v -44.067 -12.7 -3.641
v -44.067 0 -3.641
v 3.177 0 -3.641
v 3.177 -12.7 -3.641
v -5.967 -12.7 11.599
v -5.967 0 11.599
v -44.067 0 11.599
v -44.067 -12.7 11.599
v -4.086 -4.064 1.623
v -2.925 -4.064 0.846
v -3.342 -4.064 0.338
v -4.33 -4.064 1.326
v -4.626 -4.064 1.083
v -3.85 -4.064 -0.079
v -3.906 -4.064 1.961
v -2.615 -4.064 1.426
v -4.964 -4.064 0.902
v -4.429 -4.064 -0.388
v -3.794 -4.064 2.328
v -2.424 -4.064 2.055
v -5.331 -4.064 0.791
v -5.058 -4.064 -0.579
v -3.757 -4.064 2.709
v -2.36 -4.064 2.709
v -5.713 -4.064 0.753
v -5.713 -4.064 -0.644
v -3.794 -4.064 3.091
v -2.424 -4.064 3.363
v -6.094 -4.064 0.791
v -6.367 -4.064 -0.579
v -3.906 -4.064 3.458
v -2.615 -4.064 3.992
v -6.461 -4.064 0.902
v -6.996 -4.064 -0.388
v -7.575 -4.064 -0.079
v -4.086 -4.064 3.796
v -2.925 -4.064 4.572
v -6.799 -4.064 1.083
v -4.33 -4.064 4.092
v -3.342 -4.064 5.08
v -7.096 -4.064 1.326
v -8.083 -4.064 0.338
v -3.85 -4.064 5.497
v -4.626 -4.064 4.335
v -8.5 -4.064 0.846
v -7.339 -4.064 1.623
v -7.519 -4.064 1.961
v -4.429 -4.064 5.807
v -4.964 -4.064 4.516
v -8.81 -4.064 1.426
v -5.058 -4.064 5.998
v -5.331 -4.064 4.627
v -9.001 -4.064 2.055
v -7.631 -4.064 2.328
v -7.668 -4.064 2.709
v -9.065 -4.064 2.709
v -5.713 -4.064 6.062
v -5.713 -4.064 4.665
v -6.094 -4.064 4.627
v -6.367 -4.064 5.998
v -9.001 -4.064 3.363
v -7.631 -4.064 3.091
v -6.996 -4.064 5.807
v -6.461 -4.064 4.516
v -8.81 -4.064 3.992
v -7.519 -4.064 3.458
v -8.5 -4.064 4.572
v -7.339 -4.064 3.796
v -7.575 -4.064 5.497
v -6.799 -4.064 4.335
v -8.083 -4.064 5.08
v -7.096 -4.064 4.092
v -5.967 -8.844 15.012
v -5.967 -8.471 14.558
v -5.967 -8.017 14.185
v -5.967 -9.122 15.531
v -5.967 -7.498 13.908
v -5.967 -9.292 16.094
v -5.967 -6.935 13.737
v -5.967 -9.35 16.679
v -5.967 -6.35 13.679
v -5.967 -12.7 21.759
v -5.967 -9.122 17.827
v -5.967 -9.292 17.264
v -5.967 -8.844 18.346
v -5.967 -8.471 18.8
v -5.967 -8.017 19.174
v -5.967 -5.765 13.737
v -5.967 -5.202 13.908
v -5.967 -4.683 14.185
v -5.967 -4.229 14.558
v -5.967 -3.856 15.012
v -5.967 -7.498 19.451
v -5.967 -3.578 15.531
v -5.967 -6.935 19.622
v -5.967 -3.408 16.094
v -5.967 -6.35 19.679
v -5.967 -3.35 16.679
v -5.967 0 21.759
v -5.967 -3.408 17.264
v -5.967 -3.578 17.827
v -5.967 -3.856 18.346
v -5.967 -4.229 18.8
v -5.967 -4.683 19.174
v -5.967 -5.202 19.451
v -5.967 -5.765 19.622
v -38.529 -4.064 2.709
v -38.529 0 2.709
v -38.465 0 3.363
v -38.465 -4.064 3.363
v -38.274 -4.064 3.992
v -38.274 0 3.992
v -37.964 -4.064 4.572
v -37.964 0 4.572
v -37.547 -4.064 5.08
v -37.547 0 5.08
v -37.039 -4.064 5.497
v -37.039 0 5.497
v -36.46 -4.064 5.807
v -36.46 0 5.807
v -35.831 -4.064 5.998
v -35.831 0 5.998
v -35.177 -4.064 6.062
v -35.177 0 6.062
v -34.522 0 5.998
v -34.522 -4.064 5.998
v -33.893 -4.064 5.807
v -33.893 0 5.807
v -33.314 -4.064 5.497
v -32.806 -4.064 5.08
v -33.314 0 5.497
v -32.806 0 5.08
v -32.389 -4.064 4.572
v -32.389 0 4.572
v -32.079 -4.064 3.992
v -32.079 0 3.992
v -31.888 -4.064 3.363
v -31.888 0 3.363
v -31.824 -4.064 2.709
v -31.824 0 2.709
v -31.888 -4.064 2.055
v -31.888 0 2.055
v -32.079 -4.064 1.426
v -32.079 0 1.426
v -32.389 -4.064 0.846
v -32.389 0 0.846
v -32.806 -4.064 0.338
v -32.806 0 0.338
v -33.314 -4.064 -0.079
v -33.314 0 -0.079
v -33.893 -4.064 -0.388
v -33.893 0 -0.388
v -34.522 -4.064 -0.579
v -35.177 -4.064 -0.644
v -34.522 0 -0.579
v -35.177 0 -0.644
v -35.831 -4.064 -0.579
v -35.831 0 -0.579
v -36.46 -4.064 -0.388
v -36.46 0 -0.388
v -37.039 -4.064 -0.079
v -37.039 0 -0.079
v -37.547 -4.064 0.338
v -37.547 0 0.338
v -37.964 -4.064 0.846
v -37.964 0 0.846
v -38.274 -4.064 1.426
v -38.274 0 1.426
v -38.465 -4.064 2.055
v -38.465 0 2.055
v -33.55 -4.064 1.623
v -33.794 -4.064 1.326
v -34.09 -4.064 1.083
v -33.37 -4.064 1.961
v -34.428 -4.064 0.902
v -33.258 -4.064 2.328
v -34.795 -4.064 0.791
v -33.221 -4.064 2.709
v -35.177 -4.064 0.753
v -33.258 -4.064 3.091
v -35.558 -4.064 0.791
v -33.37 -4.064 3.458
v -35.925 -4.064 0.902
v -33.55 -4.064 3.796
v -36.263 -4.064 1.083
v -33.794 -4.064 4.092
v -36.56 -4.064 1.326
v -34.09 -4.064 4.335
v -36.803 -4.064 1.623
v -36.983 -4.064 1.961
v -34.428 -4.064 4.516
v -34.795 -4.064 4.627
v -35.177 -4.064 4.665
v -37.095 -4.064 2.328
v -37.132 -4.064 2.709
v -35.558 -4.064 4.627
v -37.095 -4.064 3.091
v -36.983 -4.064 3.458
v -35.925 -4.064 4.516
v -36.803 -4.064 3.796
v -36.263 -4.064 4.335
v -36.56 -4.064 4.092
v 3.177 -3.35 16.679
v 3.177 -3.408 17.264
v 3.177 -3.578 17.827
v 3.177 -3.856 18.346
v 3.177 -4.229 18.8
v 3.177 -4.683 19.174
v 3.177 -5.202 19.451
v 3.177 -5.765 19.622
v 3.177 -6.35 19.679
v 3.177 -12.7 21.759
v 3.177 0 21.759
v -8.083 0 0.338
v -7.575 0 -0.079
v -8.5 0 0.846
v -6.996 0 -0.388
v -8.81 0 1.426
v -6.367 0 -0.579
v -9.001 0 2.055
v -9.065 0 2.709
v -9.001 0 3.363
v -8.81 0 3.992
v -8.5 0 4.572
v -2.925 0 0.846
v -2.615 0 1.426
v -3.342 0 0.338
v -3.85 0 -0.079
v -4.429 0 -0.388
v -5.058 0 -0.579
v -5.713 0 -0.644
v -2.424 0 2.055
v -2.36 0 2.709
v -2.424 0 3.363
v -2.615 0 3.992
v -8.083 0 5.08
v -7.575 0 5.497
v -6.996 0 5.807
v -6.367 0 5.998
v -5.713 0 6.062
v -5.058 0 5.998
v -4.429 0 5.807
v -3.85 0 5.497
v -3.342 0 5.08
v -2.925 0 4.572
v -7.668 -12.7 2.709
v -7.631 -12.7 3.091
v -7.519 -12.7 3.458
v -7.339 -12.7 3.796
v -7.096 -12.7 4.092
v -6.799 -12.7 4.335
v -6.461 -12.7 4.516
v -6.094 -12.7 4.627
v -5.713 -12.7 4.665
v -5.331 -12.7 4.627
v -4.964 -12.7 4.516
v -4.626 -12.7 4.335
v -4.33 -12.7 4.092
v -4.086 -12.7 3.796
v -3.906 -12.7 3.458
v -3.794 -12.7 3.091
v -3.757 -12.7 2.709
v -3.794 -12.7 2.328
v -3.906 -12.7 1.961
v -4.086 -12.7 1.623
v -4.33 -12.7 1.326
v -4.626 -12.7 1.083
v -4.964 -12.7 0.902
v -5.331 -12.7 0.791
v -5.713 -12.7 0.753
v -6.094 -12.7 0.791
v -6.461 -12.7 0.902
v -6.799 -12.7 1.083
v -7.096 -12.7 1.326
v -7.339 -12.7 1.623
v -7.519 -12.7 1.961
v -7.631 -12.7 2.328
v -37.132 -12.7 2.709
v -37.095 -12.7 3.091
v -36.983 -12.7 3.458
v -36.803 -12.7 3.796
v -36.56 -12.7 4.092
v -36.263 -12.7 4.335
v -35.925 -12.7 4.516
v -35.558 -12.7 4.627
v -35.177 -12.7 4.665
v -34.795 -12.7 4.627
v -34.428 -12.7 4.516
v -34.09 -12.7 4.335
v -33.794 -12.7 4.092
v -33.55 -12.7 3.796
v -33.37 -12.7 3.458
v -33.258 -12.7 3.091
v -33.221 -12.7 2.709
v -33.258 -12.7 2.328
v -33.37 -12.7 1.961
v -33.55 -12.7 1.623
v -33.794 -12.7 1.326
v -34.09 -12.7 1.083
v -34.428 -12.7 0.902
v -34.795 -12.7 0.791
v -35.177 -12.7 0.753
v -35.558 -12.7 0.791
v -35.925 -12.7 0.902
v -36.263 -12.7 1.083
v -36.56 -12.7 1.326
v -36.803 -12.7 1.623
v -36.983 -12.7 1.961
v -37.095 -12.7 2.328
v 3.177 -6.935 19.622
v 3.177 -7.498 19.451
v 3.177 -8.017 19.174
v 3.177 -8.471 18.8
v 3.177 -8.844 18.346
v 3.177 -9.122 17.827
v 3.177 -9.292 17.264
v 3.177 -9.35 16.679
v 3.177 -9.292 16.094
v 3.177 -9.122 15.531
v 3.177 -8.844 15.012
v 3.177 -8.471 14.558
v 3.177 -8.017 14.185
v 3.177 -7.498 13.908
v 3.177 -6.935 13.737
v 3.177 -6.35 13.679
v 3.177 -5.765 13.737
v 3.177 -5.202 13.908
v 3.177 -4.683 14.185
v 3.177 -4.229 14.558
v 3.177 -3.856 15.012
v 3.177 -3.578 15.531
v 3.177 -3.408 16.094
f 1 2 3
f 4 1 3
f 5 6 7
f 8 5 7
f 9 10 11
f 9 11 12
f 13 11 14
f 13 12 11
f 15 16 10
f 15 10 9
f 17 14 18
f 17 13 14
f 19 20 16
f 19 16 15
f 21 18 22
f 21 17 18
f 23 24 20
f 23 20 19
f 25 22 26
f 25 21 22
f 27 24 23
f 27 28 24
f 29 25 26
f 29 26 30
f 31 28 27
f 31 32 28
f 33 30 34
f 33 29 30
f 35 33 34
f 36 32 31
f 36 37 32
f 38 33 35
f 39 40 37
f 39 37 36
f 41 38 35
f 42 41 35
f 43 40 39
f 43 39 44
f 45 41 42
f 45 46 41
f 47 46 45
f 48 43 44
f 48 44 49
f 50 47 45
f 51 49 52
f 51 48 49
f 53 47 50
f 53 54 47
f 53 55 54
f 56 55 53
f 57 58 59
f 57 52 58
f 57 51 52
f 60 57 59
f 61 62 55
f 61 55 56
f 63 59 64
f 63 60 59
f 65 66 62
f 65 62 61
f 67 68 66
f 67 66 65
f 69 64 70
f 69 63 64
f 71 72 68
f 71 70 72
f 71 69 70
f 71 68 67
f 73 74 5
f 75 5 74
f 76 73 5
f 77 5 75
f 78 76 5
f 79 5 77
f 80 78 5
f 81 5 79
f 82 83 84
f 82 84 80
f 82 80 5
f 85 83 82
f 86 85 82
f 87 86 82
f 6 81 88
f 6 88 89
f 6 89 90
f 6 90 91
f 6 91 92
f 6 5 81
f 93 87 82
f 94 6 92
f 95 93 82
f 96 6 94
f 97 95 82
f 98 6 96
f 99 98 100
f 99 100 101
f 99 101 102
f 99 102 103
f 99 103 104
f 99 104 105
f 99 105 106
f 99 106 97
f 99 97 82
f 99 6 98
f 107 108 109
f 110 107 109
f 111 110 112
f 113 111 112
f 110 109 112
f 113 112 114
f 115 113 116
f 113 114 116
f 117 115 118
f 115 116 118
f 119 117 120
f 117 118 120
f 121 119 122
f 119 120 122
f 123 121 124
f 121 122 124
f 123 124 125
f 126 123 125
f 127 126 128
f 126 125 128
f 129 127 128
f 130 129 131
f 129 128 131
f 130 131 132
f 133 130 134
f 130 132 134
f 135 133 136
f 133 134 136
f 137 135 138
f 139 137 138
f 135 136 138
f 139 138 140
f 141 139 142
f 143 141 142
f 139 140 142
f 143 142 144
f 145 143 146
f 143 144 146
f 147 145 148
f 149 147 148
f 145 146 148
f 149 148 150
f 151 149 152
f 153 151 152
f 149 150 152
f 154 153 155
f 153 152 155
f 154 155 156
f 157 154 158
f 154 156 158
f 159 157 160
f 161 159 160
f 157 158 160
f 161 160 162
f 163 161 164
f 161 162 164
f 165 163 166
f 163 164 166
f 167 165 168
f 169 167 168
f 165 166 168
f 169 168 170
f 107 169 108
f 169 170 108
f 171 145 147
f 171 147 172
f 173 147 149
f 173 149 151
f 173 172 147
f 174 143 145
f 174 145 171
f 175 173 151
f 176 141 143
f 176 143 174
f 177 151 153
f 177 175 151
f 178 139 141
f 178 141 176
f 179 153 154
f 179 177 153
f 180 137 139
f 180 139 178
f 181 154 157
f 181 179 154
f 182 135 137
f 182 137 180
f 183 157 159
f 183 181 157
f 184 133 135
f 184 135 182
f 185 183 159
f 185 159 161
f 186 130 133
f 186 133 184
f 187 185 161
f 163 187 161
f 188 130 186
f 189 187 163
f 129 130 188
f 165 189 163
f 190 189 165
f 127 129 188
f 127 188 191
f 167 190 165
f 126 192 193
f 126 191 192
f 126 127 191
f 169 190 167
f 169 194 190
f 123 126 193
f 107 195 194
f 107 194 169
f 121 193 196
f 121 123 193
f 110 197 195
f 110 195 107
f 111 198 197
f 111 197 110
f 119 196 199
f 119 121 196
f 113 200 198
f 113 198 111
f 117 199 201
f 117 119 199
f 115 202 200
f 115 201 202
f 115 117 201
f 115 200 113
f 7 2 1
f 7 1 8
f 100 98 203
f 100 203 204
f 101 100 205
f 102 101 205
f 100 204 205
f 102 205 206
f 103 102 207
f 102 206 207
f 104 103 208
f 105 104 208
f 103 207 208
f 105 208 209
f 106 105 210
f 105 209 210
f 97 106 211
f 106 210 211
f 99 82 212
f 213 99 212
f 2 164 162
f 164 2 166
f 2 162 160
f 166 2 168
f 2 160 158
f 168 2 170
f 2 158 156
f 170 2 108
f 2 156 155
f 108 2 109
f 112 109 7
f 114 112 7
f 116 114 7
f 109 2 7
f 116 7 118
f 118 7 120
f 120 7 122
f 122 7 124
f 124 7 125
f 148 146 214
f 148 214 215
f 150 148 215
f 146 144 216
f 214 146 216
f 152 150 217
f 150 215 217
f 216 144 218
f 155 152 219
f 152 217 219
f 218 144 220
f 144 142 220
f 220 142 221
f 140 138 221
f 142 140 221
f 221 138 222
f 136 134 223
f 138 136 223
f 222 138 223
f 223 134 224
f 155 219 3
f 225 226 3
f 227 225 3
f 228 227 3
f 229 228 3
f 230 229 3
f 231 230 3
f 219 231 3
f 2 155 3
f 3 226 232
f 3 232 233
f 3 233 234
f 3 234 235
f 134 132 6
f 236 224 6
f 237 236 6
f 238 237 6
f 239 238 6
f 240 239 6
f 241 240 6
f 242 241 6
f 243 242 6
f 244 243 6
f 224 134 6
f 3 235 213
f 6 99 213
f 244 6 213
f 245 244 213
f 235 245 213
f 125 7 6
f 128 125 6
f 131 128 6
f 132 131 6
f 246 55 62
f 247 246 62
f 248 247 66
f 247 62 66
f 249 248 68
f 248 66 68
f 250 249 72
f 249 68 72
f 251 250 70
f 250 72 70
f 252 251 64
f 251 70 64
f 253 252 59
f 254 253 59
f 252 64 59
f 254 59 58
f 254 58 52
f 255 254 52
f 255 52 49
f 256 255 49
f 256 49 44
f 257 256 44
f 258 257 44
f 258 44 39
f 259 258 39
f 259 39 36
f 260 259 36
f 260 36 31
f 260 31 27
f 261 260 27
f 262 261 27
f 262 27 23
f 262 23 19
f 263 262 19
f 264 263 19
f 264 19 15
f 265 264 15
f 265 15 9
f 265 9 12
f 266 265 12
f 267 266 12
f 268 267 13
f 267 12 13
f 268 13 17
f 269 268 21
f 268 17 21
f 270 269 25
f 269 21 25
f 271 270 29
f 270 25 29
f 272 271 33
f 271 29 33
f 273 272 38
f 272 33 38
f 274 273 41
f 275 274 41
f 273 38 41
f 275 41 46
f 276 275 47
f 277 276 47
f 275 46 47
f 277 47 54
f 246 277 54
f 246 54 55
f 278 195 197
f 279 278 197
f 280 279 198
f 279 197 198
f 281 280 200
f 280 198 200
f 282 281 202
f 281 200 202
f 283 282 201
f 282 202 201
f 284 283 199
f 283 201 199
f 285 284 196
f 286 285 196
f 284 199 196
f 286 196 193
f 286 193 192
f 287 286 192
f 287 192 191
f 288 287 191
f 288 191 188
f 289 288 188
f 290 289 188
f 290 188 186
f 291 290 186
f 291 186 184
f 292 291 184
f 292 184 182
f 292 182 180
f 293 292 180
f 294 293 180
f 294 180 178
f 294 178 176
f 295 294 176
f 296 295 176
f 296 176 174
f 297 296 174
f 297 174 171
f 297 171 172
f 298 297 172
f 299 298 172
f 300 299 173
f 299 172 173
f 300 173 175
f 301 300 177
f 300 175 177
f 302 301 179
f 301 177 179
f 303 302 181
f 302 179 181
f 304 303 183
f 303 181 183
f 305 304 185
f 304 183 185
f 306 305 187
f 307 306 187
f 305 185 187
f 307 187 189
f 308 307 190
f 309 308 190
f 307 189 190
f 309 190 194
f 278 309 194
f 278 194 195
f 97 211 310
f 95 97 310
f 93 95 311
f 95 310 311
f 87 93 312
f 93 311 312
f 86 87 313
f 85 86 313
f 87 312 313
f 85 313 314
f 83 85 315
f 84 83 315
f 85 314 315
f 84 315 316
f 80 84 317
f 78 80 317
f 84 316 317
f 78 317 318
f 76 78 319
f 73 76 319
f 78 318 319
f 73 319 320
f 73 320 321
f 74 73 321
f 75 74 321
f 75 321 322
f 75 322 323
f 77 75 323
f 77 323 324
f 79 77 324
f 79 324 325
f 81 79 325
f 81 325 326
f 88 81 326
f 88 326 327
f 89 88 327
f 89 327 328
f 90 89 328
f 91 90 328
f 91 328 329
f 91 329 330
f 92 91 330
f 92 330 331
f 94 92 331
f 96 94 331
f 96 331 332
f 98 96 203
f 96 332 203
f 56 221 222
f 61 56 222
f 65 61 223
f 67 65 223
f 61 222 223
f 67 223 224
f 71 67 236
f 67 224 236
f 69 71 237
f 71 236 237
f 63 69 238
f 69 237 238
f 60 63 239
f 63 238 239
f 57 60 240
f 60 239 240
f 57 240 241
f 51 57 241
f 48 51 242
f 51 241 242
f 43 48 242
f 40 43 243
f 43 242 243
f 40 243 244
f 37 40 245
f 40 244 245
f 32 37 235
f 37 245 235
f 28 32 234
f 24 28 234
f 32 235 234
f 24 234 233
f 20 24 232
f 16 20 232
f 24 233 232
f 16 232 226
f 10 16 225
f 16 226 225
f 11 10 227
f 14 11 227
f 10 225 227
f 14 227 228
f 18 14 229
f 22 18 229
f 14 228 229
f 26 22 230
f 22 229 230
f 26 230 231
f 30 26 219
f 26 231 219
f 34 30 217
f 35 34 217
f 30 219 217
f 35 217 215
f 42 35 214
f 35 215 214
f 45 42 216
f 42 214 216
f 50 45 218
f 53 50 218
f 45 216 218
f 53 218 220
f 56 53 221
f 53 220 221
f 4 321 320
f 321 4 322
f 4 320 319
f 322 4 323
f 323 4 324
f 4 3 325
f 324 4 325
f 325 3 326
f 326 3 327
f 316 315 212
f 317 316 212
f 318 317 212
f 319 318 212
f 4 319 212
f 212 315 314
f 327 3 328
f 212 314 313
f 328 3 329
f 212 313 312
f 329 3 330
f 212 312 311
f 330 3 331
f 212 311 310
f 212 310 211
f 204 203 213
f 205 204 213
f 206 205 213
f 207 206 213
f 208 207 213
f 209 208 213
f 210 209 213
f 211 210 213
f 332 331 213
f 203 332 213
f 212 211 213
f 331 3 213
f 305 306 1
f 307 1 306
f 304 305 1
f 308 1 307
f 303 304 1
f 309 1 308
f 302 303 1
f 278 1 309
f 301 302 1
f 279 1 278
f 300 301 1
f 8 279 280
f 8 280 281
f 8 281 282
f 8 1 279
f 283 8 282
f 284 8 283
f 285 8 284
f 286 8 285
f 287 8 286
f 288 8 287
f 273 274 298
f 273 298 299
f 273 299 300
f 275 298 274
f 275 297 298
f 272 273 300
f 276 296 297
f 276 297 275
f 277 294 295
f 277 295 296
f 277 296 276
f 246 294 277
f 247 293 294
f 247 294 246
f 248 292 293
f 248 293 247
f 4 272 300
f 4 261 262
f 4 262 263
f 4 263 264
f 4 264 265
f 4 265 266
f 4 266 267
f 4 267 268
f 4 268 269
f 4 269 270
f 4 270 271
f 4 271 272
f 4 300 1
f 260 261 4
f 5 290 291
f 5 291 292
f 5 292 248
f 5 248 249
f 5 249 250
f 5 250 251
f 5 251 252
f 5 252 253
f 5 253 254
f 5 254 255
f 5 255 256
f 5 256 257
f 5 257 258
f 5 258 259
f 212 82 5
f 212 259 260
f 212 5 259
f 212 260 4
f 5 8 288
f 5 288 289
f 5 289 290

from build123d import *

# Parameters (mm, degrees)
F0_W     = 47.244
F0_H     = 25.4
F1_DEPTH = 12.7
F2_R     = 1.9558
F3_DEPTH = 12.7
F4_R     = 3.3528
F5_DEPTH = 4.064
F7_DEPTH = 25.4
F8_W     = 38.1
F8_H     = 10.16
F9_DEPTH = 12.7


with BuildPart() as f1:
    # F0 (on Front) → F1 (new body)
    with BuildSketch(Plane.XZ):
        with Locations((-20.444557, 9.059154)):
            Rectangle(F0_W, F0_H)
    extrude(amount=F1_DEPTH)

    # F2 (on face) → F3 (cut, through all)
    with BuildSketch(Plane(origin=(0, 0, 0), x_dir=(-1, 0, 0), z_dir=(0, 1, 0))):
        with Locations((5.712557, 2.709154)):
            Circle(F2_R)
        with Locations((35.176557, 2.709154)):
            Circle(F2_R)
    extrude(amount=-F3_DEPTH, mode=Mode.SUBTRACT)

    # F4 (on face) → F5 (cut)
    with BuildSketch(Plane(origin=(0, 0, 0), x_dir=(-1, 0, 0), z_dir=(0, 1, 0))):
        with Locations((5.712557, 2.709154)):
            Circle(F4_R)
        with Locations((35.176557, 2.709154)):
            Circle(F4_R)
    extrude(amount=-F5_DEPTH, mode=Mode.SUBTRACT)

    # F6 (on face) → F7 (cut)
    with BuildSketch(Plane.YZ.offset(3.177443)):
        with BuildLine():
            ThreePointArc((-6.35, 19.679154), (-8.47132, 14.557834), (-3.35, 16.679154))
            ThreePointArc((-3.35, 16.679154), (-4.22868, 18.800474), (-6.35, 19.679154))
        make_face()
    extrude(amount=-F7_DEPTH, mode=Mode.SUBTRACT)

    # F8 (on face) → F9 (cut, through all)
    with BuildSketch(Plane(origin=(0, 0, 0), x_dir=(-1, 0, 0), z_dir=(0, 1, 0))):
        with Locations((25.016557, 16.679154)):
            Rectangle(F8_W, F8_H)
    extrude(amount=-F9_DEPTH, mode=Mode.SUBTRACT)


solid = f1.part
